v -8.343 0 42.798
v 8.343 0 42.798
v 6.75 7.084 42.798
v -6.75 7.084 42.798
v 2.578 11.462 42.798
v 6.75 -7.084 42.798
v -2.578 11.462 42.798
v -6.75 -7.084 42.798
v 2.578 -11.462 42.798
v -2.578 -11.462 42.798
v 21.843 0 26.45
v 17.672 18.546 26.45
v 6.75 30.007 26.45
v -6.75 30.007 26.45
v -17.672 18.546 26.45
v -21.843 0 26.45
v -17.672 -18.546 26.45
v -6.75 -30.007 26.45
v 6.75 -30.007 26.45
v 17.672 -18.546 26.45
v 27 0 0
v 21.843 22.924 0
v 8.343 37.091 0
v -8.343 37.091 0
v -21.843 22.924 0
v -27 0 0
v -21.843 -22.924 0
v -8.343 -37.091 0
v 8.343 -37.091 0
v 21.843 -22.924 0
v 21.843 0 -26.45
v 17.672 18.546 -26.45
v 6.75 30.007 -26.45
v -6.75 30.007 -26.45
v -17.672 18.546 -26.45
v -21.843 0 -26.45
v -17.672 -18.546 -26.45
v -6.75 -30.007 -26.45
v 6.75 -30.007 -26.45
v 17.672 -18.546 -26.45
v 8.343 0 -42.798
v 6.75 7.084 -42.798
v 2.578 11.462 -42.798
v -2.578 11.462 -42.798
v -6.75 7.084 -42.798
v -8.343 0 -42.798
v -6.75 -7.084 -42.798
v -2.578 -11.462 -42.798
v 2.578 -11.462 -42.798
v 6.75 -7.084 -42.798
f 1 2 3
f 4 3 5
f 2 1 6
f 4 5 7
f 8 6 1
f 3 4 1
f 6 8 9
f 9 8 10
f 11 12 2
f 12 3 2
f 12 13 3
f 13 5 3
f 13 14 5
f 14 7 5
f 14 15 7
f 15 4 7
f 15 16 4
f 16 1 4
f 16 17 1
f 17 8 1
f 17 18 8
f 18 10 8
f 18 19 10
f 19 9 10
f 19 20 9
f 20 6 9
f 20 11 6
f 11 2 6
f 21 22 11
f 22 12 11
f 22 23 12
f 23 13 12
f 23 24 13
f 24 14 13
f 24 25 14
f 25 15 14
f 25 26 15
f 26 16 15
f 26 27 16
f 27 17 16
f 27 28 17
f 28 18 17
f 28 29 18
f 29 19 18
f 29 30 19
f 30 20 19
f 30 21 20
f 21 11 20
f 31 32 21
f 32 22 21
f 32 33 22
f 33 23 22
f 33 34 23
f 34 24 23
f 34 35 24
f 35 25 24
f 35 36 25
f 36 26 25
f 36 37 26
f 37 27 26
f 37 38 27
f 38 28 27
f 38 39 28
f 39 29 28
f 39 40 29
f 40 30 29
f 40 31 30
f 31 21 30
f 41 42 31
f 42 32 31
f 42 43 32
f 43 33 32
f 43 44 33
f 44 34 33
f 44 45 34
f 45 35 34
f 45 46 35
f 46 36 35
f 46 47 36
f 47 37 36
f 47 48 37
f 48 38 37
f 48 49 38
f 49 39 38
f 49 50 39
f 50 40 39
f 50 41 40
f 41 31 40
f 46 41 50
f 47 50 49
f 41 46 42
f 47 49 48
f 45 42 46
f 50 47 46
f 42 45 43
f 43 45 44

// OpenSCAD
// Generated by SolidPython 1.0.1 on 2020-07-29 00:46:49


scale(v = [9, 13, 15]) {
	sphere(r = 3);
}
/***********************************************
*********      SolidPython code:      **********
************************************************
 
# import packages: SolidPython
from solid import *
from solid.utils import *
from itertools import chain, combinations, permutations


class Resize:

    def __init__(self, scad_file):
        self.scad_file = scad_file
        #self.scad_file = import_scad(scad_file)
        # cone/cylinder param:
        self.r1 = 0
        self.r2 = 0
        self.h = 0
        # rectangular prism param:
        self.w = 0
        self.l = 0
        # ellipse param:
        self.r = 0

    # import OpenScad code (file name corresponds to shape)


    # classify shape + parameters
    def assign(self, param1, param2, param3):
        if self.scad_file == 'cone.scad':
            self.r1 = param1
            self.r2 = param2
            self.h = param3
        elif self.scad_file == 'cylinder.scad':
            self.r1 = param1
            self.r2 = param2
            self.h = param3
        elif self.scad_file == 'rectangularPrism.scad':
            self.h = param1
            self.l = param2
            self.w = param3
        else:
            self.r = param1
            self.h = param2

    # resize parameters
    def iterate(self):
        x = range(3, 20, 2)
        i = 1
        if self.scad_file == 'cone.scad':
            tempList = list(permutations(x, 2))
            for temp in tempList:
                param1 = temp[0]
                param2 = temp[1]
                filepath = 'produced_scad_files/' + 'cone' + str(param1) + '_' + str(param2) + '_' + '.scad'
                scad_render_to_file(cylinder(h=param1, r1=param2, r2=0), filepath)

        elif self.scad_file == 'cylinder.scad':
            tempList = list(permutations(x, 3))
            for temp in tempList:
                param1 = temp[0]
                param2 = temp[1]
                filepath = 'produced_scad_files/' + 'cylinder' + str(param1) + '_' + str(param2) + '_' + '.scad'
                scad_render_to_file(cylinder(h=param1, r1=param2, r2=param2), filepath)

        elif self.scad_file == 'rectangularPrism.scad':
            tempList = list(permutations(x, 3))
            for temp in tempList:
                param1 = temp[0]
                param2 = temp[1]
                param3 = temp[2]
                filepath = 'produced_scad_files/' + 'rectangularPrism' + str(param1) + '_' + str(param2) + '_' + str(
                    param3) + '.scad'
                scad_render_to_file(cube(size=(param1, param2, param3)), filepath)

        elif self.scad_file == 'ellipse.scad':
            tempList = list(permutations(x, 4))
            for temp in tempList:
                param1 = temp[0]
                param2 = temp[1]
                param3 = temp[2]
                param4 = temp[3]
                filepath = 'produced_scad_files/' + 'ellipse' + str(param1) + '_' + str(param2) + '_' + str(param3) + '_' + str(param4) + '.scad'
                scad_render_to_file(scale([param1, param2, param3])(sphere(r=param4)), filepath)

    def render_to_scadfile(self):
        scad_render_to_file(scad, 'example.scad') 
 
************************************************/
